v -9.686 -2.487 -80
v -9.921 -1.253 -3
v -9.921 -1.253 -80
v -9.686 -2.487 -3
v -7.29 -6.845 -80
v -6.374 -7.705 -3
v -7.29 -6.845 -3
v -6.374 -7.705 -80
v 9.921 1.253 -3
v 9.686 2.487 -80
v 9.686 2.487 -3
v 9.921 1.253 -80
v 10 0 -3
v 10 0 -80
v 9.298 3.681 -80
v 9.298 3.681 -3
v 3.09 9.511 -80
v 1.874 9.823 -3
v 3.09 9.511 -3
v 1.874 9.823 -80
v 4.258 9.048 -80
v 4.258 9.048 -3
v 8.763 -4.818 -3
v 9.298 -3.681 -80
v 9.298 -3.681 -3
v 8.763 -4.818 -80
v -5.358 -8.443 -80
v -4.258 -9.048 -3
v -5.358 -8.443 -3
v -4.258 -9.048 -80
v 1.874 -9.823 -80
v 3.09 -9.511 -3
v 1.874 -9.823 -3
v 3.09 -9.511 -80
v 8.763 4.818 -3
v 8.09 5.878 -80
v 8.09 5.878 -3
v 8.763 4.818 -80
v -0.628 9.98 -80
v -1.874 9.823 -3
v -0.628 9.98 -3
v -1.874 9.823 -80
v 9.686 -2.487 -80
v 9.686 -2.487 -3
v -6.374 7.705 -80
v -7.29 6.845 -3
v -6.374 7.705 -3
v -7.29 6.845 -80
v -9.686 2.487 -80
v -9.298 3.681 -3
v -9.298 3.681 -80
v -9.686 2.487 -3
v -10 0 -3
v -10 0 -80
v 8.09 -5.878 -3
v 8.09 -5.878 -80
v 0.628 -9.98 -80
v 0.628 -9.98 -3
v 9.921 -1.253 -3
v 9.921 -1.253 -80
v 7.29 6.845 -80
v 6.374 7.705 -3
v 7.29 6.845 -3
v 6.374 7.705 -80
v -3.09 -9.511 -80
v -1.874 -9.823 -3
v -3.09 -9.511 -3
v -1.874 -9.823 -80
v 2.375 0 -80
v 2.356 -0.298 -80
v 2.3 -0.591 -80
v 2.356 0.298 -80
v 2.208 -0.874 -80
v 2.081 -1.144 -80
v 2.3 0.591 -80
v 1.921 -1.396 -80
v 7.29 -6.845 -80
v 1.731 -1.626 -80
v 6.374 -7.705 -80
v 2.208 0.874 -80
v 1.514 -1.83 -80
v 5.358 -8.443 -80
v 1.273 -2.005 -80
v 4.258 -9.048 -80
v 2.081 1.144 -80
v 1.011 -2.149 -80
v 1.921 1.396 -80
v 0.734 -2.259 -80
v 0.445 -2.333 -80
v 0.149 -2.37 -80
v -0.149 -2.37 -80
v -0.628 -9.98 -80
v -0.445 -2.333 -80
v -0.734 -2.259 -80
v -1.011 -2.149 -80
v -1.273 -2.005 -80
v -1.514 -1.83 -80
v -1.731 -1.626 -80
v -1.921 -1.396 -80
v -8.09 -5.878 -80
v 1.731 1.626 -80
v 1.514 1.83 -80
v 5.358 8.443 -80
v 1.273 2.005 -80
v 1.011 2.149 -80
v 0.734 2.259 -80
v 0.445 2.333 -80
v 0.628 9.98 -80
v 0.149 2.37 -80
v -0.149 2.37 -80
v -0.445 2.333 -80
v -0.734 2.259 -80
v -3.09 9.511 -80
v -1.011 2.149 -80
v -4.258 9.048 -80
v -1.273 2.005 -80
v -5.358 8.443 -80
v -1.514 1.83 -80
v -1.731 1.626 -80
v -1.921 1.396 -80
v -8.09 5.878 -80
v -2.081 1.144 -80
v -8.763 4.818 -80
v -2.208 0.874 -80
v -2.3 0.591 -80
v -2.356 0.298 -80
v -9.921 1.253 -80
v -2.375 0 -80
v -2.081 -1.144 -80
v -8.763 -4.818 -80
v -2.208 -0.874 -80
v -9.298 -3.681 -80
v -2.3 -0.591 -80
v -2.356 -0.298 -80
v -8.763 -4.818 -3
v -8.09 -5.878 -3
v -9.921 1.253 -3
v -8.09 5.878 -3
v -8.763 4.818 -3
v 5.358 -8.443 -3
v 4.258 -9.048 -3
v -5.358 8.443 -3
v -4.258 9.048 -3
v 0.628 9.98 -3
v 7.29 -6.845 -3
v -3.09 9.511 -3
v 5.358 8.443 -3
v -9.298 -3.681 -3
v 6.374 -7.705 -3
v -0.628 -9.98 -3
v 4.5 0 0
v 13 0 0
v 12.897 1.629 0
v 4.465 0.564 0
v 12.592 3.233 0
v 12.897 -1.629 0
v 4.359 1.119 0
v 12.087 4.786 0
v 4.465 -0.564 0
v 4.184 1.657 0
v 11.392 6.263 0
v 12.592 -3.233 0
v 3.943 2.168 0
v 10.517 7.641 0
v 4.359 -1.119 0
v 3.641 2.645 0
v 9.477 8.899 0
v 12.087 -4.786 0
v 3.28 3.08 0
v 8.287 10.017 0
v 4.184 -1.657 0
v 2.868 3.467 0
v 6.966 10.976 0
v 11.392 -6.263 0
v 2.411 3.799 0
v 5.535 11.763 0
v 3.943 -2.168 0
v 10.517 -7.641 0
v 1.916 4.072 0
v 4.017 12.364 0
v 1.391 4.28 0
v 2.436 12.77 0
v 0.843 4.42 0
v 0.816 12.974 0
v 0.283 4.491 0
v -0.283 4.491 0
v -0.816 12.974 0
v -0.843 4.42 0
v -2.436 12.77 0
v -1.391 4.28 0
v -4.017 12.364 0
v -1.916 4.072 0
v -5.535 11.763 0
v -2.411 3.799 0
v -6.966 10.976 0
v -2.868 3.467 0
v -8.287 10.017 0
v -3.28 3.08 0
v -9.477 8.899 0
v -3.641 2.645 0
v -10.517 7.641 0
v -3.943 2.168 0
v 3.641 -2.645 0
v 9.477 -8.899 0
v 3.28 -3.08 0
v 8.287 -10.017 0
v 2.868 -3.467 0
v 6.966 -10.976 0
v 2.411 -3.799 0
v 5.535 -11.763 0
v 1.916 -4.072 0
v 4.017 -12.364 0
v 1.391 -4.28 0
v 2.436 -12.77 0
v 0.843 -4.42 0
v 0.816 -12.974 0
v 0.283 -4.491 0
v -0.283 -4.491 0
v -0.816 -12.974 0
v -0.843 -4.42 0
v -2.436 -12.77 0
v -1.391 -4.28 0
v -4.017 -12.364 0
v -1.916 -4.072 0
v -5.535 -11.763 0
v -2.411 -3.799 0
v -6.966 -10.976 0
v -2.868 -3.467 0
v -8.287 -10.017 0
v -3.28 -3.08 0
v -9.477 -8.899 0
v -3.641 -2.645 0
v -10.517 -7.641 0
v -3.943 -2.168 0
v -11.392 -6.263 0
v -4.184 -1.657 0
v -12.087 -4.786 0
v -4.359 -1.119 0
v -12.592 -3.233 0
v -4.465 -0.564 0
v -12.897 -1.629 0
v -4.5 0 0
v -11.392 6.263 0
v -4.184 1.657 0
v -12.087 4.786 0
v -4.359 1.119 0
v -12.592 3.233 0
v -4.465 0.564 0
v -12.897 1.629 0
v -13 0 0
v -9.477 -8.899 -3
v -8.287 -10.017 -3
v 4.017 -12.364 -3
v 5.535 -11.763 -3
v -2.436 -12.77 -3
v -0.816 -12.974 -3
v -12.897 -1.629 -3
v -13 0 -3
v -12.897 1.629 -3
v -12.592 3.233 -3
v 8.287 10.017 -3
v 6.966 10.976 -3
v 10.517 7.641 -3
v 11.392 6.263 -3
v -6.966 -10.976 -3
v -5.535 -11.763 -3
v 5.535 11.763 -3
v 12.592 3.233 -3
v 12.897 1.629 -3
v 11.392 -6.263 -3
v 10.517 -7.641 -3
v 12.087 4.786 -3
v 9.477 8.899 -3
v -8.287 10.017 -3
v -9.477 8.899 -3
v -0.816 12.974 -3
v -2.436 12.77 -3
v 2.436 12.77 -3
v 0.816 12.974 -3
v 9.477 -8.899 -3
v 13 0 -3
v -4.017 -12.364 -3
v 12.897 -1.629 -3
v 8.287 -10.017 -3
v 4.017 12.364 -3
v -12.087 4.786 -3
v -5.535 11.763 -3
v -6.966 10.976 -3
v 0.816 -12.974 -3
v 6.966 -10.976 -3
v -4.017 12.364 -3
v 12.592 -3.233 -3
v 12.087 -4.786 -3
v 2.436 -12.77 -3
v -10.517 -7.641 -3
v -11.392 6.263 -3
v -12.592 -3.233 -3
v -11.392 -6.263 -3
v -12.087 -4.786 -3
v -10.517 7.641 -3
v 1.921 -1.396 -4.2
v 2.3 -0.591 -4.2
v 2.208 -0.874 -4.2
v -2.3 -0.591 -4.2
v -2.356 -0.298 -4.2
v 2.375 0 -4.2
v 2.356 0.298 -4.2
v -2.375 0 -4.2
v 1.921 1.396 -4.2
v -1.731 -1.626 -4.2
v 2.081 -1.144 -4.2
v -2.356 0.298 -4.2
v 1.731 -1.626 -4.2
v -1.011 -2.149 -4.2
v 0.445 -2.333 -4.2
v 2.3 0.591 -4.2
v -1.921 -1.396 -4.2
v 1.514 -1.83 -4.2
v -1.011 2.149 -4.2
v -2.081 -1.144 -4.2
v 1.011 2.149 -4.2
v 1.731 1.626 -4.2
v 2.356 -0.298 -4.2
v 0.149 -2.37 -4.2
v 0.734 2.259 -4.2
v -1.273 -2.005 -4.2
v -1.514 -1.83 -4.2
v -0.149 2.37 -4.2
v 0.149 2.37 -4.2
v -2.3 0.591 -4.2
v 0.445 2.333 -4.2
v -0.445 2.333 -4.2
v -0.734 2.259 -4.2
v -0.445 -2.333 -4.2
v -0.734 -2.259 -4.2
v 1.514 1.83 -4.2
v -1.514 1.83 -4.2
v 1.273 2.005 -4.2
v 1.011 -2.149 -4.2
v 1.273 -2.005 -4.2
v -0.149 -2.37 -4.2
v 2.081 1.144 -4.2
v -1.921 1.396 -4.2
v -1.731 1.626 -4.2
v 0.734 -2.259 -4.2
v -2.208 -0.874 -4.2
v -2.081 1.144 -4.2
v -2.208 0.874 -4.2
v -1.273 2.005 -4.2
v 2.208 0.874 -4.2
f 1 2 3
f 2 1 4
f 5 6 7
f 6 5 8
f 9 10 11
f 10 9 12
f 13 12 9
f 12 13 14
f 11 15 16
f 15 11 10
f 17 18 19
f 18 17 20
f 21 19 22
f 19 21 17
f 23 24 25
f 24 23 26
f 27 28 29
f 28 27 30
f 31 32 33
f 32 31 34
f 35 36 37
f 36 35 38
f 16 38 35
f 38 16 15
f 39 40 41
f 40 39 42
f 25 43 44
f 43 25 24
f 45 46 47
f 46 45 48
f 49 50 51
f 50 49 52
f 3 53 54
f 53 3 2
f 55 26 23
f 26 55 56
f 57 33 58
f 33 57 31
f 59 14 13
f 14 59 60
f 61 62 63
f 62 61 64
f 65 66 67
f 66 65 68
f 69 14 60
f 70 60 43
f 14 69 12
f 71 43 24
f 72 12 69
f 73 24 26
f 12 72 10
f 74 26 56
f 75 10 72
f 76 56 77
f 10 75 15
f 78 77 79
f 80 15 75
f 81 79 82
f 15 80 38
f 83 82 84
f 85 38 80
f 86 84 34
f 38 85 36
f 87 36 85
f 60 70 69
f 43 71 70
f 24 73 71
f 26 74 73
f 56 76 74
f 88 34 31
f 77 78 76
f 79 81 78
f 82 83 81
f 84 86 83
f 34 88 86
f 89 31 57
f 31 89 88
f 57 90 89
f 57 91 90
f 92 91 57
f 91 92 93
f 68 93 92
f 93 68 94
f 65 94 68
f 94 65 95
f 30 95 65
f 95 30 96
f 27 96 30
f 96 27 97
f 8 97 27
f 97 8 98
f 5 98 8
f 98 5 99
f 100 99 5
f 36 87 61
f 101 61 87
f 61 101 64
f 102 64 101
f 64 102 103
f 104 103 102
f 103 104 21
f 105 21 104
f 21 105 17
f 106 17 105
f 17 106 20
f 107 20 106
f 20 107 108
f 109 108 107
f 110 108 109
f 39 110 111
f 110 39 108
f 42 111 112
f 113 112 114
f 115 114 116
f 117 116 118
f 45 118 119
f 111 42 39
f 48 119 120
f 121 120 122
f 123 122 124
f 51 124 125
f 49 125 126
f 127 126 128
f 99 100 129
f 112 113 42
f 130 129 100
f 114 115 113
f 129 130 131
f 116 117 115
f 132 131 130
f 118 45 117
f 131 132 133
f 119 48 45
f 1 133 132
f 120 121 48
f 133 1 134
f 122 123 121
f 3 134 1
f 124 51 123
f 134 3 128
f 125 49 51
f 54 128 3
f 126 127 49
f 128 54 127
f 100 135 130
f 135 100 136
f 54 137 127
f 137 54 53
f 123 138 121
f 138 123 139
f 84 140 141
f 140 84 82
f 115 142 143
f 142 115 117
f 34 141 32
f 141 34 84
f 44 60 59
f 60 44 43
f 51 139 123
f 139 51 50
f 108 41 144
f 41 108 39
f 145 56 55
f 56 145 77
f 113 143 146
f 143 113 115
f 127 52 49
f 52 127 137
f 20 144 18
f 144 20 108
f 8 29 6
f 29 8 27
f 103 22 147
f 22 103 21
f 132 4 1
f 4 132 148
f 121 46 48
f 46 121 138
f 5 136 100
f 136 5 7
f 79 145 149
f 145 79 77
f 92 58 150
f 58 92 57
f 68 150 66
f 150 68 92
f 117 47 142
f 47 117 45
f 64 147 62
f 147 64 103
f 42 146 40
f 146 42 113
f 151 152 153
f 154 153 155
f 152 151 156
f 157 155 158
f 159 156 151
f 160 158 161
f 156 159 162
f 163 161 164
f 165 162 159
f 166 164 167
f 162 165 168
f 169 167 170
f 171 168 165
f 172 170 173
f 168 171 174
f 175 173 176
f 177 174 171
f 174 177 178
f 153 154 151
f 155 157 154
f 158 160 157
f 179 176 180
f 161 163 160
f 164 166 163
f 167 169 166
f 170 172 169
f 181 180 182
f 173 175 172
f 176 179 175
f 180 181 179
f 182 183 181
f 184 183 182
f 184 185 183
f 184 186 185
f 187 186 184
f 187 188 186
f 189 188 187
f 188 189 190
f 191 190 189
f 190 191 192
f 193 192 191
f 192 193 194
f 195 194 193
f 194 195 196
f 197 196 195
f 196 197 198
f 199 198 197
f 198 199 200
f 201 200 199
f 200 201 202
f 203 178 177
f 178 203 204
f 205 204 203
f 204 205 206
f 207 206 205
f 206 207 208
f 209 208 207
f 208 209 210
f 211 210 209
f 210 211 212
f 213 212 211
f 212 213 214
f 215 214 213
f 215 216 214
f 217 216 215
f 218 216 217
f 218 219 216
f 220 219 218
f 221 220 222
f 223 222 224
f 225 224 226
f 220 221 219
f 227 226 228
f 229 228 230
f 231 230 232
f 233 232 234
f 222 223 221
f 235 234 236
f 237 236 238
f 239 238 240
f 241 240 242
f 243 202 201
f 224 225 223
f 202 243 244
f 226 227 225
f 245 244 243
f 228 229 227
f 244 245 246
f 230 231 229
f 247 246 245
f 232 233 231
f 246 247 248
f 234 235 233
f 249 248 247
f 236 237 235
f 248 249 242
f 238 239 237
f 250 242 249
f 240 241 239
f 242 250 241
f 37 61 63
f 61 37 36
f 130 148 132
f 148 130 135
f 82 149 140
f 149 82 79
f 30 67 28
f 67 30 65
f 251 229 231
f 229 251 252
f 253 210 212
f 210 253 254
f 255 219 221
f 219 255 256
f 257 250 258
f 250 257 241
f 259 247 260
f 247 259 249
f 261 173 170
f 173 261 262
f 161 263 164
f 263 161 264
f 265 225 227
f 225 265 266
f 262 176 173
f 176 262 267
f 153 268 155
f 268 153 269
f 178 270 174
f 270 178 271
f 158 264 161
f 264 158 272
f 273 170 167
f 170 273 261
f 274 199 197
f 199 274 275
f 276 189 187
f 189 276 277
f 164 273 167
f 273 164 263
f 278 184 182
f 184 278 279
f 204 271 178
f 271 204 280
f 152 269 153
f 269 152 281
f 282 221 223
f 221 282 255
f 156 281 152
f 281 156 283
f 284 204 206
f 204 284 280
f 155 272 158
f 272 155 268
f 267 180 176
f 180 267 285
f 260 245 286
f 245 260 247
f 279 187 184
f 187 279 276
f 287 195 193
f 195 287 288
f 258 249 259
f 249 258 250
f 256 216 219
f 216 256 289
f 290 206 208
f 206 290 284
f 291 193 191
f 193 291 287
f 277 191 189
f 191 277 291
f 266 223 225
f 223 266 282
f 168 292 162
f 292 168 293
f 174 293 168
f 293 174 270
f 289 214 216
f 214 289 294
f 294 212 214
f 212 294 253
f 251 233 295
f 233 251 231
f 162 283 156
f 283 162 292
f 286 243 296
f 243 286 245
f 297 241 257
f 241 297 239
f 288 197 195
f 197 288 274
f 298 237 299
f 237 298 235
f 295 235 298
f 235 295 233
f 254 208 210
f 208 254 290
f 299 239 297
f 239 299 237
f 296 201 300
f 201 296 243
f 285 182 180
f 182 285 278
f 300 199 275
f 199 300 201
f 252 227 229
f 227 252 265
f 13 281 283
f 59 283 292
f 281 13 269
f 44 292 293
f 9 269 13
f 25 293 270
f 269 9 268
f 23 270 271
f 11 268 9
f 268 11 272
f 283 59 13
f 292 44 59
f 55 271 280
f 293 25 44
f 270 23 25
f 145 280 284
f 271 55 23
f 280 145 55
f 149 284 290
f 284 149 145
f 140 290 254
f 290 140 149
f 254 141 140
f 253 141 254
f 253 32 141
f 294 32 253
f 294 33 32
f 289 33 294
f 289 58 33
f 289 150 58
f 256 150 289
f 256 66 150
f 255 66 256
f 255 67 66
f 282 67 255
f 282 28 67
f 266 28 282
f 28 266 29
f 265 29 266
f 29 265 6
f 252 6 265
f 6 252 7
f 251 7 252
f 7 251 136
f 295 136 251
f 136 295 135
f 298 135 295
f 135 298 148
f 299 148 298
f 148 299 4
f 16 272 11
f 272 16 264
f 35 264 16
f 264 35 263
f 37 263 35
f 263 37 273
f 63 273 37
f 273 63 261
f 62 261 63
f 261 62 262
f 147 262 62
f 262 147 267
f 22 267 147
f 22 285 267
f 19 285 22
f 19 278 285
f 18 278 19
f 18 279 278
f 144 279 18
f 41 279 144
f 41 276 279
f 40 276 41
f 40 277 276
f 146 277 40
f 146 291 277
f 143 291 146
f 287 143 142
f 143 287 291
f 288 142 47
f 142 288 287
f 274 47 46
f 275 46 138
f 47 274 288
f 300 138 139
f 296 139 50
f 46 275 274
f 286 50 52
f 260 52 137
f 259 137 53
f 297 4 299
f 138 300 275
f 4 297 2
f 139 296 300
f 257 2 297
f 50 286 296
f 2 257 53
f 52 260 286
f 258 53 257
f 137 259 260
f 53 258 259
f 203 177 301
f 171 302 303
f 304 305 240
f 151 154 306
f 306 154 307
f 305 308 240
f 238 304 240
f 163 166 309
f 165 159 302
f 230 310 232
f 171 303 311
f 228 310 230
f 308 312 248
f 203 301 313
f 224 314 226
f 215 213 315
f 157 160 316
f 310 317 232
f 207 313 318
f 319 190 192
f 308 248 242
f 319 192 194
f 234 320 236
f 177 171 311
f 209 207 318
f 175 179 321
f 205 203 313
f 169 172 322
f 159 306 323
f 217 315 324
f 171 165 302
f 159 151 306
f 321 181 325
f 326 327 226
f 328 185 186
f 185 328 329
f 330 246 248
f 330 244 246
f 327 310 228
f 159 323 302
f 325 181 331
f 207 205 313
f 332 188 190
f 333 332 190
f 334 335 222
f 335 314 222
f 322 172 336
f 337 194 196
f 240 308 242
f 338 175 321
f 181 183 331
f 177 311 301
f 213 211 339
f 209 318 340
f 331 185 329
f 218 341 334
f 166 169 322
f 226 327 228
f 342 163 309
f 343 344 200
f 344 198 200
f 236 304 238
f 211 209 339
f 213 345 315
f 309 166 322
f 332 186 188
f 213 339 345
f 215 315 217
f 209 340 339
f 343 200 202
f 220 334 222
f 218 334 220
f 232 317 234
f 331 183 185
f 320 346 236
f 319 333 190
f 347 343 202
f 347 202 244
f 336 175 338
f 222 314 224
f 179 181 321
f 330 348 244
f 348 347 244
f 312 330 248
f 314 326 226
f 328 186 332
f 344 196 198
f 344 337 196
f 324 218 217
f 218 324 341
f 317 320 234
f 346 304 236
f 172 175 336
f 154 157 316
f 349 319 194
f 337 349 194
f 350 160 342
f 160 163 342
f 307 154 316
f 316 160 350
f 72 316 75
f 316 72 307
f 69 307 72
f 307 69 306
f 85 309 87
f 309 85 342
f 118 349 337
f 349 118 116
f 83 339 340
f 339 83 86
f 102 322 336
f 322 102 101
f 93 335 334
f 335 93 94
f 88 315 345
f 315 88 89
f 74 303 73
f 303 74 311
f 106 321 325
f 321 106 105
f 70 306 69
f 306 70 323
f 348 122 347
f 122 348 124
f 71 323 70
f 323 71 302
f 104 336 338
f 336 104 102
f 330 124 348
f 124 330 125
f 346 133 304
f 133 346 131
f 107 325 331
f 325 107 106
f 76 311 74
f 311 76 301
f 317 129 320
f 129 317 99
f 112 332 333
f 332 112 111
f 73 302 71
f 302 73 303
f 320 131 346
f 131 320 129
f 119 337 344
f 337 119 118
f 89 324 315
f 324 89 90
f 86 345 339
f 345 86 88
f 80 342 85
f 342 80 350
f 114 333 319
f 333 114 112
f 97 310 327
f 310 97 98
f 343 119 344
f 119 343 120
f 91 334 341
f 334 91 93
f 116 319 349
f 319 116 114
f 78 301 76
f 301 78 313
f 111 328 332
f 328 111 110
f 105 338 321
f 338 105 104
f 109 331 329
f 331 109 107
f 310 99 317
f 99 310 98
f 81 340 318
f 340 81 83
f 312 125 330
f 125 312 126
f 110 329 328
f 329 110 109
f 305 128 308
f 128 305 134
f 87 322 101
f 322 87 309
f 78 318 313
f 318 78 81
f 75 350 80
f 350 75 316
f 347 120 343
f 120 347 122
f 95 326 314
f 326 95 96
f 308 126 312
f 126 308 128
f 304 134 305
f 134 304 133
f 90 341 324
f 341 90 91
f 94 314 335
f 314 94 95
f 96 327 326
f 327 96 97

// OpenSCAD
$fn = 50;


difference() {
	union() {
		translate(v = [0, 0, -80.0000000000]) {
			cylinder(h = 80, r = 10.0000000000);
		}
		translate(v = [0, 0, -3.0000000000]) {
			cylinder(h = 3, r = 13.0000000000);
		}
	}
	union() {
		translate(v = [0, 0, 0]) {
			rotate(a = [0, 0, 0]) {
				difference() {
					union() {
						#translate(v = [0, 0, -80.0000000000]) {
							cylinder(h = 80, r = 2.2500000000);
						}
						#translate(v = [0, 0, -4.2000000000]) {
							cylinder(h = 4.2000000000, r = 10.0000000000, r1 = 2.3750000000, r2 = 4.5000000000);
						}
						#translate(v = [0, 0, -80.0000000000]) {
							cylinder(h = 80, r = 2.3750000000);
						}
						#translate(v = [0, 0, -80.0000000000]) {
							cylinder(h = 80, r = 2.2500000000);
						}
					}
					union();
				}
			}
		}
	}
}
